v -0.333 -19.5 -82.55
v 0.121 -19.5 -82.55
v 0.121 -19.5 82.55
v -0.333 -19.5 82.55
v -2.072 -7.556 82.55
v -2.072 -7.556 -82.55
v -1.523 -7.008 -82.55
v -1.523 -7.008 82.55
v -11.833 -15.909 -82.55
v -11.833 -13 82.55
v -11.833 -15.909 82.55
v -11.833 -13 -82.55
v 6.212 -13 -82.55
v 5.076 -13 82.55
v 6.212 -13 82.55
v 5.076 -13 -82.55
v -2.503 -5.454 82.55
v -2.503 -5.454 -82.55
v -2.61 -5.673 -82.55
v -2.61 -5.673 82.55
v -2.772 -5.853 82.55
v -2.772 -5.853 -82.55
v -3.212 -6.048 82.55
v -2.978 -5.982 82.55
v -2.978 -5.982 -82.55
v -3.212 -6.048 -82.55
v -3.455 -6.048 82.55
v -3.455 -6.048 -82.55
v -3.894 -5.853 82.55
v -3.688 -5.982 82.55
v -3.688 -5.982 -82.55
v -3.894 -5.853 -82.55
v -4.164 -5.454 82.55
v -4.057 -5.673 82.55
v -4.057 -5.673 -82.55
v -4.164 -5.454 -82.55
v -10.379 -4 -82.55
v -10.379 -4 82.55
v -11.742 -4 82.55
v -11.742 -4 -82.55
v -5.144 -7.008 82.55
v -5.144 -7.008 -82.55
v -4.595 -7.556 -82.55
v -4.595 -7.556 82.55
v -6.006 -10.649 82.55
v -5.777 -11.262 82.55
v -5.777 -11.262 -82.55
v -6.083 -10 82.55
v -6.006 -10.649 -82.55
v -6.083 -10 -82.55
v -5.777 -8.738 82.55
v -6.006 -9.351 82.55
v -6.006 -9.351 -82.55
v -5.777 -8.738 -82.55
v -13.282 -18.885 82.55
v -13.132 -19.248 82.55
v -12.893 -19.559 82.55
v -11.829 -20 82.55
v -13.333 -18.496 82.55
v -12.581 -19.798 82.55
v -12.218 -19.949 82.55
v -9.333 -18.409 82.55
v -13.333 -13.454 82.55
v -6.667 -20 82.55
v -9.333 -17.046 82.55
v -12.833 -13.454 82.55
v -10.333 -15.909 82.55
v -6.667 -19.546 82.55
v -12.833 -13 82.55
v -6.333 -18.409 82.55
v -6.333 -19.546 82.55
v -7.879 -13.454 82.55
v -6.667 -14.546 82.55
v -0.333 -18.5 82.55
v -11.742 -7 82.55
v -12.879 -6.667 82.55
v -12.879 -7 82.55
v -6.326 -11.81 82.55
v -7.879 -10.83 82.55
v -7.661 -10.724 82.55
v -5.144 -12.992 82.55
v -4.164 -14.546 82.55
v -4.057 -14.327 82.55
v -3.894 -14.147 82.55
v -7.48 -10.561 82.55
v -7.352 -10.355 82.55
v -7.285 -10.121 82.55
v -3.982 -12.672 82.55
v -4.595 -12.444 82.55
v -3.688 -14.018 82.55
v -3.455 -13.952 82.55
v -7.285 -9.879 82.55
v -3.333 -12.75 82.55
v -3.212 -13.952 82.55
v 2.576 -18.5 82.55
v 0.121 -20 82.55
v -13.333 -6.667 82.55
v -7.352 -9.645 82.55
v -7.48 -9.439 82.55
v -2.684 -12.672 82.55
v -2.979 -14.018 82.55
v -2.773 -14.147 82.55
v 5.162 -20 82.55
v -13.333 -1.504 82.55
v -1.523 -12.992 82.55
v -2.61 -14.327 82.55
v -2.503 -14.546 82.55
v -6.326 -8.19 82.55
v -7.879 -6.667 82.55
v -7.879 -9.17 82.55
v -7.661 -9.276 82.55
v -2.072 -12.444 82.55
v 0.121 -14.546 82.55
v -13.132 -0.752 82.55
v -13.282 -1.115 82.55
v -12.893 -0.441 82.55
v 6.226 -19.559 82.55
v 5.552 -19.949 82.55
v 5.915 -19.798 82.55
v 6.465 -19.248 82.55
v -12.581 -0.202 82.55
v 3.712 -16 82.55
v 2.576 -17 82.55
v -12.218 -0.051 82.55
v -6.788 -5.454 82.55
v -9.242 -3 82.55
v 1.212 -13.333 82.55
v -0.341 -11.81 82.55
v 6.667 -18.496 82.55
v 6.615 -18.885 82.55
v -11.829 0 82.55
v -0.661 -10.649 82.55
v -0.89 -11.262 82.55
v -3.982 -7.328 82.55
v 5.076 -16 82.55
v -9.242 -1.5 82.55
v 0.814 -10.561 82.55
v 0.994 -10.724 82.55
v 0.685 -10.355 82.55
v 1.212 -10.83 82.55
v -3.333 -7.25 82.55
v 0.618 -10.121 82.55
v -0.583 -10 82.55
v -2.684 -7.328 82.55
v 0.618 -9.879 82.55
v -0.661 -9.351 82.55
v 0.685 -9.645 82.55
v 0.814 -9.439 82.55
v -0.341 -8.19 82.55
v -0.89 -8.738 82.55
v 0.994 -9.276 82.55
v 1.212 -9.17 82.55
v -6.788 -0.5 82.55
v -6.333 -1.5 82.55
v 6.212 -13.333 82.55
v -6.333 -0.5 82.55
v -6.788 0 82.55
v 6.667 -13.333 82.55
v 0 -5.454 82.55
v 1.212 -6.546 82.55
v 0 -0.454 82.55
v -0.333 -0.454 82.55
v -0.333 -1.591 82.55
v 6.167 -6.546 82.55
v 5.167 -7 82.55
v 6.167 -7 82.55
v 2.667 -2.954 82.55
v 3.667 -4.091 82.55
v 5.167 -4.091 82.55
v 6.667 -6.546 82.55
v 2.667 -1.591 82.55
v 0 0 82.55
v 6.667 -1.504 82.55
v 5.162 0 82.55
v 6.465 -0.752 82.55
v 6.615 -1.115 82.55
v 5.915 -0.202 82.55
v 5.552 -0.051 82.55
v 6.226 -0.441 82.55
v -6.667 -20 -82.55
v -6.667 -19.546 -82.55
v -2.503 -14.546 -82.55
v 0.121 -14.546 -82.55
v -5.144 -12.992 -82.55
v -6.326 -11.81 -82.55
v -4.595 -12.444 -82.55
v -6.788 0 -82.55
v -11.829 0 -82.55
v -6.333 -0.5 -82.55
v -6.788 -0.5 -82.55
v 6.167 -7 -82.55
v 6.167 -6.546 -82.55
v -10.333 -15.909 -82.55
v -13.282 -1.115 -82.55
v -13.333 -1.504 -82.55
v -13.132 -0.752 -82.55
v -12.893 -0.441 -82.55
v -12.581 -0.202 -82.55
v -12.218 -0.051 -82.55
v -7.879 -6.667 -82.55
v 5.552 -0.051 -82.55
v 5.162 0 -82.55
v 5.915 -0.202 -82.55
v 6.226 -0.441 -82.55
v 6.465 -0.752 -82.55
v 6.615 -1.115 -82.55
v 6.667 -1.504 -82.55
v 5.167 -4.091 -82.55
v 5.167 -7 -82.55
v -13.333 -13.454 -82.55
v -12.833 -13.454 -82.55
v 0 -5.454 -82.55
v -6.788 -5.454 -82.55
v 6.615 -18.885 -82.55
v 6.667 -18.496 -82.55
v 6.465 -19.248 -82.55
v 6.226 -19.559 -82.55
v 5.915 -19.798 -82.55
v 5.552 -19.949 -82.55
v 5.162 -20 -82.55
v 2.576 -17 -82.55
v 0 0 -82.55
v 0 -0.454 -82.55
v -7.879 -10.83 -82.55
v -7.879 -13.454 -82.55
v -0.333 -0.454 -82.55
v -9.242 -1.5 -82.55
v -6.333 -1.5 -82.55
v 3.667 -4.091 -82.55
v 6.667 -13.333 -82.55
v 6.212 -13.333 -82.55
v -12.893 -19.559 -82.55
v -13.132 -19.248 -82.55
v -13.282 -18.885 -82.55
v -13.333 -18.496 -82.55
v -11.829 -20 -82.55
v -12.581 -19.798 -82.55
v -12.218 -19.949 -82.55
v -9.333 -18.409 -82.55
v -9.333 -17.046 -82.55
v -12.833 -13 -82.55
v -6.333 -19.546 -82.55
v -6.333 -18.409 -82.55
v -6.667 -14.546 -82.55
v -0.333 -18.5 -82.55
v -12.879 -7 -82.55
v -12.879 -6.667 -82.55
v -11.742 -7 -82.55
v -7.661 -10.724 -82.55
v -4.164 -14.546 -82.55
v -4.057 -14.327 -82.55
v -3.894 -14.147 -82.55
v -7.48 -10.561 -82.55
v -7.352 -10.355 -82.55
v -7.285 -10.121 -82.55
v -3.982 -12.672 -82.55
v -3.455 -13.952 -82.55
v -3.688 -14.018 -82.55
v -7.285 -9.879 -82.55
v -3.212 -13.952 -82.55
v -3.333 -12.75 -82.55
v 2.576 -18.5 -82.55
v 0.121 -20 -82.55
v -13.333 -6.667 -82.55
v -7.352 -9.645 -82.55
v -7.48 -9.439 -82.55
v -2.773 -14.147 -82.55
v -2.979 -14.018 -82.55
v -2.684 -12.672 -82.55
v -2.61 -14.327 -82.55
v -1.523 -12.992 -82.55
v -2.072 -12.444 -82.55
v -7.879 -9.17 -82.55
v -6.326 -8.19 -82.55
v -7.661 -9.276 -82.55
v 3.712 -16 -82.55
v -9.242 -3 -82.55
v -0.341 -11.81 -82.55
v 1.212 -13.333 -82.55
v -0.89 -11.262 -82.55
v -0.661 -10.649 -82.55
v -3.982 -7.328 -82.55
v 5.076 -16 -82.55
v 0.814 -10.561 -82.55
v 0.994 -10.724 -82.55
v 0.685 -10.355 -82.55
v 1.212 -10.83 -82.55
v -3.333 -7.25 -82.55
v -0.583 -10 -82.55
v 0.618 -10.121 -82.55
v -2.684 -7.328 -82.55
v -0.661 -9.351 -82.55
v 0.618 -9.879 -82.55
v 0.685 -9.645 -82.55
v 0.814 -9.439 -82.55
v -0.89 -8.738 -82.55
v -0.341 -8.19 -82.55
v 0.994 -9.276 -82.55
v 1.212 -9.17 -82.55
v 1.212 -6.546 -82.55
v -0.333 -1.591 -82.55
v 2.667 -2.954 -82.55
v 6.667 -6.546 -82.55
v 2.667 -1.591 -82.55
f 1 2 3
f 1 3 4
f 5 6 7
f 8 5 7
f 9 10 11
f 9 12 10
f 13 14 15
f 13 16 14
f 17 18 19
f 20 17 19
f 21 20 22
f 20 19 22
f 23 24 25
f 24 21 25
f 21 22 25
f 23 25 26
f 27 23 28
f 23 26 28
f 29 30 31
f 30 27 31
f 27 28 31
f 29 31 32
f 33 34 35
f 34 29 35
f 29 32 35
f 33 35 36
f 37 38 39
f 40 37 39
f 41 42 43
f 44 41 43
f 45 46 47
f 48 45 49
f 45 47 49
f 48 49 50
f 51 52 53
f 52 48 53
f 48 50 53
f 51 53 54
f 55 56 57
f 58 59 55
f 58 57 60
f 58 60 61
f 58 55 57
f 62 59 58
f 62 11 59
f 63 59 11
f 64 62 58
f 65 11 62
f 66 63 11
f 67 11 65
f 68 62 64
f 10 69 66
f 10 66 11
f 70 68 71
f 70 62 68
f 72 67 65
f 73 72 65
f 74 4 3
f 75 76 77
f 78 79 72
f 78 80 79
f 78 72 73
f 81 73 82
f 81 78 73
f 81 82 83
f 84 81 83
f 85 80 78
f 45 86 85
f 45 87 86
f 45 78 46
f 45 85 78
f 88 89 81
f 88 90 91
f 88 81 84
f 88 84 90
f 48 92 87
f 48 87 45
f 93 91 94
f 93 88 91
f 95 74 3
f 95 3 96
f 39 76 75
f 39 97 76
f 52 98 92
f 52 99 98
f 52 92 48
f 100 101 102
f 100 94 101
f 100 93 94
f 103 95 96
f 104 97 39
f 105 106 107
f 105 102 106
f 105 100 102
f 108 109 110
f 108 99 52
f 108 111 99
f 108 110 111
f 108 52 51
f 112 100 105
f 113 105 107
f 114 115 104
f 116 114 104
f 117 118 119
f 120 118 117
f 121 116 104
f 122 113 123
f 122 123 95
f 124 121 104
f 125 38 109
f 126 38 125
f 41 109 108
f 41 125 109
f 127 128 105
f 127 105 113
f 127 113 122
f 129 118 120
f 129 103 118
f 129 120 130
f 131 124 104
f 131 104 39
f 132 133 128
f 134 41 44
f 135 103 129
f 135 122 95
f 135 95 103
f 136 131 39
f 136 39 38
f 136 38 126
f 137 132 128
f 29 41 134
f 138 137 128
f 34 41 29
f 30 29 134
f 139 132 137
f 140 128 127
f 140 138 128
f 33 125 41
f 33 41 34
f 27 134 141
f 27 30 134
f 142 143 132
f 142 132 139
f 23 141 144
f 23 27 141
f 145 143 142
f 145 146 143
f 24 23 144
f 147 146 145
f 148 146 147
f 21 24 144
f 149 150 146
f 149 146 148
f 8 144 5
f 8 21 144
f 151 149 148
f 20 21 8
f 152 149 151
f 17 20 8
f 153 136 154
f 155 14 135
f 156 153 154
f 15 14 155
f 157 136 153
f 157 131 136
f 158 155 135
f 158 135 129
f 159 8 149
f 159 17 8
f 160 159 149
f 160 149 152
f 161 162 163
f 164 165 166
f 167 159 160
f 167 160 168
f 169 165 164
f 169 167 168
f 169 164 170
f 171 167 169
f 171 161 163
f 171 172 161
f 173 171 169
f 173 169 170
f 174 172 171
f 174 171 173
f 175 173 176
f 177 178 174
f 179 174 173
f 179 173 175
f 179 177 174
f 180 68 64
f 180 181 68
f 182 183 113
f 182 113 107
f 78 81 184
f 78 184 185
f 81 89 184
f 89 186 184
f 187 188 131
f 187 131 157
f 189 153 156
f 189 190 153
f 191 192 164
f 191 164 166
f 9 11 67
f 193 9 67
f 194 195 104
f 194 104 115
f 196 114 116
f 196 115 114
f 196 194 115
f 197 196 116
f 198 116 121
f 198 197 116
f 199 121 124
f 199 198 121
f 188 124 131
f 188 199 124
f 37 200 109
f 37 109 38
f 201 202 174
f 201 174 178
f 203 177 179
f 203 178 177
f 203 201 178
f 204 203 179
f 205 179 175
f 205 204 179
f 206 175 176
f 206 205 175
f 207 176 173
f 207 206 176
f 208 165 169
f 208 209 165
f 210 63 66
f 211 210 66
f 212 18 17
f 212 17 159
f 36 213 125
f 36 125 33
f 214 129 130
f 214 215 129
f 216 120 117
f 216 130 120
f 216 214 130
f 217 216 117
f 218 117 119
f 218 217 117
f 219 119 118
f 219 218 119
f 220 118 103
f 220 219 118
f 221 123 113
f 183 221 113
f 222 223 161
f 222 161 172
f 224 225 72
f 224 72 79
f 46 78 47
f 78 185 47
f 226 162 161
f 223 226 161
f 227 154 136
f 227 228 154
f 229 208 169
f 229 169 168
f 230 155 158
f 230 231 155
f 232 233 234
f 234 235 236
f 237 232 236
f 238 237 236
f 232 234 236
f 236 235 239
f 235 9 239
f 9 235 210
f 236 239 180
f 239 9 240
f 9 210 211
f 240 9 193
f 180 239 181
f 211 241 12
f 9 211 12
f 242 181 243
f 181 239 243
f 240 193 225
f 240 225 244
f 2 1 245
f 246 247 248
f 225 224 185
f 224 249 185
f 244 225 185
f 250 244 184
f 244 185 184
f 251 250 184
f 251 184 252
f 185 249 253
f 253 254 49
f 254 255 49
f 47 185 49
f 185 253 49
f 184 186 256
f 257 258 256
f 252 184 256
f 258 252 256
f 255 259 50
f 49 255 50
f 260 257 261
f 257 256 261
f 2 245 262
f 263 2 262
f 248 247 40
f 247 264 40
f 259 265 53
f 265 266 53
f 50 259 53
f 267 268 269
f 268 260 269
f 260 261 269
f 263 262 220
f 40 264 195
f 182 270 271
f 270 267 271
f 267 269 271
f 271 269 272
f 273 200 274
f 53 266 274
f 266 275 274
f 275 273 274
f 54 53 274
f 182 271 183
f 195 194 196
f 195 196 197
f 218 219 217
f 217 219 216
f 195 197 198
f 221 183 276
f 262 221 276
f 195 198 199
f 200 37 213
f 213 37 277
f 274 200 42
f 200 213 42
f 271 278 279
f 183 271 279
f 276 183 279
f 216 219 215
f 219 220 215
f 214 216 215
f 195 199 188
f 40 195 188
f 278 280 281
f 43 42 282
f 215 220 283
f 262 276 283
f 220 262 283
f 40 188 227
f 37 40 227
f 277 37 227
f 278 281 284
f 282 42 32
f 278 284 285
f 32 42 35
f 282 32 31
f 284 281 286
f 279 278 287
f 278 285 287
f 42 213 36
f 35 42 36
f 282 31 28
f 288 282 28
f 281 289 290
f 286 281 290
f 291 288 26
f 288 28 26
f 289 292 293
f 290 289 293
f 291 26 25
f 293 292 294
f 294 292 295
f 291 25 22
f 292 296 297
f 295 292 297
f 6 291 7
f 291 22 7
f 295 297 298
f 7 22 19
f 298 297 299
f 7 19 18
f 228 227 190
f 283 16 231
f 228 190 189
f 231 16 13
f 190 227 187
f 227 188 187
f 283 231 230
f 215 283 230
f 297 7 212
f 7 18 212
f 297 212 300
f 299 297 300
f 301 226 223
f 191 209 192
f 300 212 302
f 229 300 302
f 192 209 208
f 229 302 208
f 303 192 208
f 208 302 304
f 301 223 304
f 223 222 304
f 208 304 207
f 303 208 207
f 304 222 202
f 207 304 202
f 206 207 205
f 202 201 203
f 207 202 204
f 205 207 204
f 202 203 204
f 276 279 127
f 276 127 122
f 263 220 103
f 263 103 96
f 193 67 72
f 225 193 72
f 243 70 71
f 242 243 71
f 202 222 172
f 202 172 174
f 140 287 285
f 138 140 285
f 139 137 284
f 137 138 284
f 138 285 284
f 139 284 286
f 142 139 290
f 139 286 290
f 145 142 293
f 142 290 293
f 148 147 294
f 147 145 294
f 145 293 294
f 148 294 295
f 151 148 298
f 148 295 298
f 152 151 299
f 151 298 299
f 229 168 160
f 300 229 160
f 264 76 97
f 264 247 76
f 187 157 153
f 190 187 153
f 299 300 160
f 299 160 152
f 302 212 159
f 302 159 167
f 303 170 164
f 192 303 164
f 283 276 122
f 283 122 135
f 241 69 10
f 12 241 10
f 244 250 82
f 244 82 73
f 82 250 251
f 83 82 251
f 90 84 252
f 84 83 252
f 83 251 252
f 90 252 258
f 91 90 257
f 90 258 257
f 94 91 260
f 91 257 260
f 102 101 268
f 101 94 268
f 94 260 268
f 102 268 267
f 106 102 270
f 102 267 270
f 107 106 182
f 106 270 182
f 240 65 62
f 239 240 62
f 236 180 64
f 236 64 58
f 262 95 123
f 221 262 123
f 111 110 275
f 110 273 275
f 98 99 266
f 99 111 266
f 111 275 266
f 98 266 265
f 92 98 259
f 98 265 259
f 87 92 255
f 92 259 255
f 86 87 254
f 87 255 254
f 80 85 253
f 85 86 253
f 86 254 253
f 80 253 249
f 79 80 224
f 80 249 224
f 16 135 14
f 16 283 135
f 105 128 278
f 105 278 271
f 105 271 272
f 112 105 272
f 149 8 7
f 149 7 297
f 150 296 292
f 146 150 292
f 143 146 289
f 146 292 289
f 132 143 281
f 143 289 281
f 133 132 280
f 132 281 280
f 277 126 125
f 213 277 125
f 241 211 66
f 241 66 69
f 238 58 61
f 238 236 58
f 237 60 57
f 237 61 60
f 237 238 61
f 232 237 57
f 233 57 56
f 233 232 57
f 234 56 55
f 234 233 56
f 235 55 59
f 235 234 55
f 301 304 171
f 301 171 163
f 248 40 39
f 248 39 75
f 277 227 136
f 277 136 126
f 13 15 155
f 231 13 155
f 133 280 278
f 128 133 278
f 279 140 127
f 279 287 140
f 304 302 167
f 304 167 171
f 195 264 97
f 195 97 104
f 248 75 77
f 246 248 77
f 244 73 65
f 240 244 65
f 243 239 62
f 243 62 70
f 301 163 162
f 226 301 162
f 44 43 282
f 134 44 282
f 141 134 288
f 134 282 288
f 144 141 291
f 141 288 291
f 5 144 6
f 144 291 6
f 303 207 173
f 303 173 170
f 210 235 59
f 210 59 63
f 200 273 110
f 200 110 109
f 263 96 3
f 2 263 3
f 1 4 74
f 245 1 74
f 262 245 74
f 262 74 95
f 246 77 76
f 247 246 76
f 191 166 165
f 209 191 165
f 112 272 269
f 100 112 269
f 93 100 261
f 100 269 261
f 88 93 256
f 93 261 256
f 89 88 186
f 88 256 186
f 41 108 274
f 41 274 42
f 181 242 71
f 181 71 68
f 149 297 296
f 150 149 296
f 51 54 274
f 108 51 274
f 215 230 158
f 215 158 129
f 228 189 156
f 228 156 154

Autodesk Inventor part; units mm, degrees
ref_plane "YZ Plane" through (0, 0, 0) normal (1, 0, 0) x (0, 1, 0)
ref_plane "XZ Plane" through (0, 0, 0) normal (0, 1, 0) x (-1, 0, 0)
sketch "Sketch1" plane through (0, 0, 0) normal (0, 0, 1) x (1, 0, 0)
  line L0 (0.1212, -19.5) -> (-0.3333, -19.5)
  line L1 (0.1212, -20) -> (0.1212, -19.5)
  line L2 (5.1624, -20) -> (0.1212, -20)
  arc A0 (5.1624, -20) -> (6.6667, -18.4957) centre (5.1624, -18.4957) ccw
  line L3 (6.6667, -13.3333) -> (6.6667, -18.4957)
  line L4 (6.2121, -13.3333) -> (6.6667, -13.3333)
  line L5 (6.2121, -13) -> (6.2121, -13.3333)
  line L6 (5.0758, -13) -> (6.2121, -13)
  line L7 (5.0758, -16) -> (5.0758, -13)
  line L8 (3.7121, -16) -> (5.0758, -16)
  line L9 (1.2121, -13.3333) -> (3.7121, -16)
  line L10 (1.2121, -10.8302) -> (1.2121, -13.3333)
  arc A1 (1.2121, -9.1698) -> (1.2121, -10.8302) centre (1.483, -10) ccw
  line L11 (1.2121, -6.5455) -> (1.2121, -9.1698)
  line L12 (3.6667, -4.0909) -> (1.2121, -6.5455)
  line L13 (5.1667, -4.0909) -> (3.6667, -4.0909)
  line L14 (5.1667, -7) -> (5.1667, -4.0909)
  line L15 (6.1667, -7) -> (5.1667, -7)
  line L16 (6.1667, -6.5455) -> (6.1667, -7)
  line L17 (6.6667, -6.5455) -> (6.1667, -6.5455)
  line L18 (6.6667, -1.5043) -> (6.6667, -6.5455)
  arc A2 (6.6667, -1.5043) -> (5.1624, 0) centre (5.1624, -1.5043) ccw
  line L19 (0, 0) -> (5.1624, 0)
  line L20 (0, -0.4545) -> (0, 0)
  line L21 (-0.3333, -0.4545) -> (0, -0.4545)
  line L22 (-0.3333, -1.5909) -> (-0.3333, -0.4545)
  line L23 (2.6667, -1.5909) -> (-0.3333, -1.5909)
  line L24 (2.6667, -2.9545) -> (2.6667, -1.5909)
  line L25 (0, -5.4545) -> (2.6667, -2.9545)
  line L26 (-2.5032, -5.4545) -> (0, -5.4545)
  arc A3 (-4.1635, -5.4545) -> (-2.5032, -5.4545) centre (-3.3333, -5.1837) ccw
  line L27 (-6.7879, -5.4545) -> (-4.1635, -5.4545)
  line L28 (-9.2424, -3) -> (-6.7879, -5.4545)
  line L29 (-9.2424, -1.5) -> (-9.2424, -3)
  line L30 (-6.3333, -1.5) -> (-9.2424, -1.5)
  line L31 (-6.3333, -0.5) -> (-6.3333, -1.5)
  line L32 (-6.7879, -0.5) -> (-6.3333, -0.5)
  line L33 (-6.7879, 0) -> (-6.7879, -0.5)
  line L34 (-11.829, 0) -> (-6.7879, 0)
  arc A4 (-11.829, 0) -> (-13.3333, -1.5043) centre (-11.829, -1.5043) ccw
  line L35 (-13.3333, -6.6667) -> (-13.3333, -1.5043)
  line L36 (-12.8788, -6.6667) -> (-13.3333, -6.6667)
  line L37 (-12.8788, -7) -> (-12.8788, -6.6667)
  line L38 (-11.7424, -7) -> (-12.8788, -7)
  line L39 (-11.7424, -4) -> (-11.7424, -7)
  line L40 (-10.3788, -4) -> (-11.7424, -4)
  line L41 (-7.8788, -6.6667) -> (-10.3788, -4)
  line L42 (-7.8788, -9.1698) -> (-7.8788, -6.6667)
  arc A5 (-7.8788, -10.8302) -> (-7.8788, -9.1698) centre (-8.1497, -10) ccw
  line L43 (-7.8788, -13.4545) -> (-7.8788, -10.8302)
  line L44 (-10.3333, -15.9091) -> (-7.8788, -13.4545)
  line L45 (-11.8333, -15.9091) -> (-10.3333, -15.9091)
  line L46 (-11.8333, -13) -> (-11.8333, -15.9091)
  line L47 (-12.8333, -13) -> (-11.8333, -13)
  line L48 (-12.8333, -13.4545) -> (-12.8333, -13)
  line L49 (-13.3333, -13.4545) -> (-12.8333, -13.4545)
  line L50 (-13.3333, -18.4957) -> (-13.3333, -13.4545)
  arc A6 (-13.3333, -18.4957) -> (-11.829, -20) centre (-11.829, -18.4957) ccw
  line L51 (-6.6667, -20) -> (-11.829, -20)
  line L52 (-6.6667, -19.5455) -> (-6.6667, -20)
  line L53 (-6.3333, -19.5455) -> (-6.6667, -19.5455)
  line L54 (-6.3333, -18.4091) -> (-6.3333, -19.5455)
  line L55 (-9.3333, -18.4091) -> (-6.3333, -18.4091)
  line L56 (-9.3333, -17.0455) -> (-9.3333, -18.4091)
  line L57 (-6.6667, -14.5455) -> (-9.3333, -17.0455)
  line L58 (-4.1635, -14.5455) -> (-6.6667, -14.5455)
  arc A7 (-2.5032, -14.5455) -> (-4.1635, -14.5455) centre (-3.3333, -14.8163) ccw
  line L59 (0.1212, -14.5455) -> (-2.5032, -14.5455)
  line L60 (2.5758, -17) -> (0.1212, -14.5455)
  line L61 (2.5758, -18.5) -> (2.5758, -17)
  line L62 (-0.3333, -18.5) -> (2.5758, -18.5)
  line L63 (-0.3333, -19.5) -> (-0.3333, -18.5)
  line L64 (-1.523, -12.9923) -> (-2.0717, -12.4435)
  arc A8 (-4.5949, -12.4435) -> (-2.0717, -12.4435) centre (-3.3333, -10) ccw
  line L65 (-4.5949, -12.4435) -> (-5.1437, -12.9923)
  line L66 (-5.1437, -12.9923) -> (-6.3256, -11.8104)
  line L67 (-6.3256, -11.8104) -> (-5.7769, -11.2616)
  arc A9 (-5.7769, -8.7384) -> (-5.7769, -11.2616) centre (-3.3333, -10) ccw
  line L68 (-5.7769, -8.7384) -> (-6.3256, -8.1896)
  line L69 (-6.3256, -8.1896) -> (-5.1437, -7.0077)
  line L70 (-5.1437, -7.0077) -> (-4.5949, -7.5565)
  arc A10 (-2.0717, -7.5565) -> (-4.5949, -7.5565) centre (-3.3333, -10) ccw
  line L71 (-2.0717, -7.5565) -> (-1.523, -7.0077)
  line L72 (-1.523, -7.0077) -> (-0.3411, -8.1896)
  line L73 (-0.3411, -8.1896) -> (-0.8898, -8.7384)
  arc A11 (-0.8898, -11.2616) -> (-0.8898, -8.7384) centre (-3.3333, -10) ccw
  line L74 (-0.8898, -11.2616) -> (-0.3411, -11.8104)
  line L75 (-0.3411, -11.8104) -> (-1.523, -12.9923)
  point P0 (-13.3333, -20)
extrude "Extrusion1" add sketch "Sketch1" along normal mid plane 165.1
ref_plane "Work Plane1" through (0, 0, 0) normal (0, 0, 1) x (1, 0, 0)
properties part number "Lift Connector"
